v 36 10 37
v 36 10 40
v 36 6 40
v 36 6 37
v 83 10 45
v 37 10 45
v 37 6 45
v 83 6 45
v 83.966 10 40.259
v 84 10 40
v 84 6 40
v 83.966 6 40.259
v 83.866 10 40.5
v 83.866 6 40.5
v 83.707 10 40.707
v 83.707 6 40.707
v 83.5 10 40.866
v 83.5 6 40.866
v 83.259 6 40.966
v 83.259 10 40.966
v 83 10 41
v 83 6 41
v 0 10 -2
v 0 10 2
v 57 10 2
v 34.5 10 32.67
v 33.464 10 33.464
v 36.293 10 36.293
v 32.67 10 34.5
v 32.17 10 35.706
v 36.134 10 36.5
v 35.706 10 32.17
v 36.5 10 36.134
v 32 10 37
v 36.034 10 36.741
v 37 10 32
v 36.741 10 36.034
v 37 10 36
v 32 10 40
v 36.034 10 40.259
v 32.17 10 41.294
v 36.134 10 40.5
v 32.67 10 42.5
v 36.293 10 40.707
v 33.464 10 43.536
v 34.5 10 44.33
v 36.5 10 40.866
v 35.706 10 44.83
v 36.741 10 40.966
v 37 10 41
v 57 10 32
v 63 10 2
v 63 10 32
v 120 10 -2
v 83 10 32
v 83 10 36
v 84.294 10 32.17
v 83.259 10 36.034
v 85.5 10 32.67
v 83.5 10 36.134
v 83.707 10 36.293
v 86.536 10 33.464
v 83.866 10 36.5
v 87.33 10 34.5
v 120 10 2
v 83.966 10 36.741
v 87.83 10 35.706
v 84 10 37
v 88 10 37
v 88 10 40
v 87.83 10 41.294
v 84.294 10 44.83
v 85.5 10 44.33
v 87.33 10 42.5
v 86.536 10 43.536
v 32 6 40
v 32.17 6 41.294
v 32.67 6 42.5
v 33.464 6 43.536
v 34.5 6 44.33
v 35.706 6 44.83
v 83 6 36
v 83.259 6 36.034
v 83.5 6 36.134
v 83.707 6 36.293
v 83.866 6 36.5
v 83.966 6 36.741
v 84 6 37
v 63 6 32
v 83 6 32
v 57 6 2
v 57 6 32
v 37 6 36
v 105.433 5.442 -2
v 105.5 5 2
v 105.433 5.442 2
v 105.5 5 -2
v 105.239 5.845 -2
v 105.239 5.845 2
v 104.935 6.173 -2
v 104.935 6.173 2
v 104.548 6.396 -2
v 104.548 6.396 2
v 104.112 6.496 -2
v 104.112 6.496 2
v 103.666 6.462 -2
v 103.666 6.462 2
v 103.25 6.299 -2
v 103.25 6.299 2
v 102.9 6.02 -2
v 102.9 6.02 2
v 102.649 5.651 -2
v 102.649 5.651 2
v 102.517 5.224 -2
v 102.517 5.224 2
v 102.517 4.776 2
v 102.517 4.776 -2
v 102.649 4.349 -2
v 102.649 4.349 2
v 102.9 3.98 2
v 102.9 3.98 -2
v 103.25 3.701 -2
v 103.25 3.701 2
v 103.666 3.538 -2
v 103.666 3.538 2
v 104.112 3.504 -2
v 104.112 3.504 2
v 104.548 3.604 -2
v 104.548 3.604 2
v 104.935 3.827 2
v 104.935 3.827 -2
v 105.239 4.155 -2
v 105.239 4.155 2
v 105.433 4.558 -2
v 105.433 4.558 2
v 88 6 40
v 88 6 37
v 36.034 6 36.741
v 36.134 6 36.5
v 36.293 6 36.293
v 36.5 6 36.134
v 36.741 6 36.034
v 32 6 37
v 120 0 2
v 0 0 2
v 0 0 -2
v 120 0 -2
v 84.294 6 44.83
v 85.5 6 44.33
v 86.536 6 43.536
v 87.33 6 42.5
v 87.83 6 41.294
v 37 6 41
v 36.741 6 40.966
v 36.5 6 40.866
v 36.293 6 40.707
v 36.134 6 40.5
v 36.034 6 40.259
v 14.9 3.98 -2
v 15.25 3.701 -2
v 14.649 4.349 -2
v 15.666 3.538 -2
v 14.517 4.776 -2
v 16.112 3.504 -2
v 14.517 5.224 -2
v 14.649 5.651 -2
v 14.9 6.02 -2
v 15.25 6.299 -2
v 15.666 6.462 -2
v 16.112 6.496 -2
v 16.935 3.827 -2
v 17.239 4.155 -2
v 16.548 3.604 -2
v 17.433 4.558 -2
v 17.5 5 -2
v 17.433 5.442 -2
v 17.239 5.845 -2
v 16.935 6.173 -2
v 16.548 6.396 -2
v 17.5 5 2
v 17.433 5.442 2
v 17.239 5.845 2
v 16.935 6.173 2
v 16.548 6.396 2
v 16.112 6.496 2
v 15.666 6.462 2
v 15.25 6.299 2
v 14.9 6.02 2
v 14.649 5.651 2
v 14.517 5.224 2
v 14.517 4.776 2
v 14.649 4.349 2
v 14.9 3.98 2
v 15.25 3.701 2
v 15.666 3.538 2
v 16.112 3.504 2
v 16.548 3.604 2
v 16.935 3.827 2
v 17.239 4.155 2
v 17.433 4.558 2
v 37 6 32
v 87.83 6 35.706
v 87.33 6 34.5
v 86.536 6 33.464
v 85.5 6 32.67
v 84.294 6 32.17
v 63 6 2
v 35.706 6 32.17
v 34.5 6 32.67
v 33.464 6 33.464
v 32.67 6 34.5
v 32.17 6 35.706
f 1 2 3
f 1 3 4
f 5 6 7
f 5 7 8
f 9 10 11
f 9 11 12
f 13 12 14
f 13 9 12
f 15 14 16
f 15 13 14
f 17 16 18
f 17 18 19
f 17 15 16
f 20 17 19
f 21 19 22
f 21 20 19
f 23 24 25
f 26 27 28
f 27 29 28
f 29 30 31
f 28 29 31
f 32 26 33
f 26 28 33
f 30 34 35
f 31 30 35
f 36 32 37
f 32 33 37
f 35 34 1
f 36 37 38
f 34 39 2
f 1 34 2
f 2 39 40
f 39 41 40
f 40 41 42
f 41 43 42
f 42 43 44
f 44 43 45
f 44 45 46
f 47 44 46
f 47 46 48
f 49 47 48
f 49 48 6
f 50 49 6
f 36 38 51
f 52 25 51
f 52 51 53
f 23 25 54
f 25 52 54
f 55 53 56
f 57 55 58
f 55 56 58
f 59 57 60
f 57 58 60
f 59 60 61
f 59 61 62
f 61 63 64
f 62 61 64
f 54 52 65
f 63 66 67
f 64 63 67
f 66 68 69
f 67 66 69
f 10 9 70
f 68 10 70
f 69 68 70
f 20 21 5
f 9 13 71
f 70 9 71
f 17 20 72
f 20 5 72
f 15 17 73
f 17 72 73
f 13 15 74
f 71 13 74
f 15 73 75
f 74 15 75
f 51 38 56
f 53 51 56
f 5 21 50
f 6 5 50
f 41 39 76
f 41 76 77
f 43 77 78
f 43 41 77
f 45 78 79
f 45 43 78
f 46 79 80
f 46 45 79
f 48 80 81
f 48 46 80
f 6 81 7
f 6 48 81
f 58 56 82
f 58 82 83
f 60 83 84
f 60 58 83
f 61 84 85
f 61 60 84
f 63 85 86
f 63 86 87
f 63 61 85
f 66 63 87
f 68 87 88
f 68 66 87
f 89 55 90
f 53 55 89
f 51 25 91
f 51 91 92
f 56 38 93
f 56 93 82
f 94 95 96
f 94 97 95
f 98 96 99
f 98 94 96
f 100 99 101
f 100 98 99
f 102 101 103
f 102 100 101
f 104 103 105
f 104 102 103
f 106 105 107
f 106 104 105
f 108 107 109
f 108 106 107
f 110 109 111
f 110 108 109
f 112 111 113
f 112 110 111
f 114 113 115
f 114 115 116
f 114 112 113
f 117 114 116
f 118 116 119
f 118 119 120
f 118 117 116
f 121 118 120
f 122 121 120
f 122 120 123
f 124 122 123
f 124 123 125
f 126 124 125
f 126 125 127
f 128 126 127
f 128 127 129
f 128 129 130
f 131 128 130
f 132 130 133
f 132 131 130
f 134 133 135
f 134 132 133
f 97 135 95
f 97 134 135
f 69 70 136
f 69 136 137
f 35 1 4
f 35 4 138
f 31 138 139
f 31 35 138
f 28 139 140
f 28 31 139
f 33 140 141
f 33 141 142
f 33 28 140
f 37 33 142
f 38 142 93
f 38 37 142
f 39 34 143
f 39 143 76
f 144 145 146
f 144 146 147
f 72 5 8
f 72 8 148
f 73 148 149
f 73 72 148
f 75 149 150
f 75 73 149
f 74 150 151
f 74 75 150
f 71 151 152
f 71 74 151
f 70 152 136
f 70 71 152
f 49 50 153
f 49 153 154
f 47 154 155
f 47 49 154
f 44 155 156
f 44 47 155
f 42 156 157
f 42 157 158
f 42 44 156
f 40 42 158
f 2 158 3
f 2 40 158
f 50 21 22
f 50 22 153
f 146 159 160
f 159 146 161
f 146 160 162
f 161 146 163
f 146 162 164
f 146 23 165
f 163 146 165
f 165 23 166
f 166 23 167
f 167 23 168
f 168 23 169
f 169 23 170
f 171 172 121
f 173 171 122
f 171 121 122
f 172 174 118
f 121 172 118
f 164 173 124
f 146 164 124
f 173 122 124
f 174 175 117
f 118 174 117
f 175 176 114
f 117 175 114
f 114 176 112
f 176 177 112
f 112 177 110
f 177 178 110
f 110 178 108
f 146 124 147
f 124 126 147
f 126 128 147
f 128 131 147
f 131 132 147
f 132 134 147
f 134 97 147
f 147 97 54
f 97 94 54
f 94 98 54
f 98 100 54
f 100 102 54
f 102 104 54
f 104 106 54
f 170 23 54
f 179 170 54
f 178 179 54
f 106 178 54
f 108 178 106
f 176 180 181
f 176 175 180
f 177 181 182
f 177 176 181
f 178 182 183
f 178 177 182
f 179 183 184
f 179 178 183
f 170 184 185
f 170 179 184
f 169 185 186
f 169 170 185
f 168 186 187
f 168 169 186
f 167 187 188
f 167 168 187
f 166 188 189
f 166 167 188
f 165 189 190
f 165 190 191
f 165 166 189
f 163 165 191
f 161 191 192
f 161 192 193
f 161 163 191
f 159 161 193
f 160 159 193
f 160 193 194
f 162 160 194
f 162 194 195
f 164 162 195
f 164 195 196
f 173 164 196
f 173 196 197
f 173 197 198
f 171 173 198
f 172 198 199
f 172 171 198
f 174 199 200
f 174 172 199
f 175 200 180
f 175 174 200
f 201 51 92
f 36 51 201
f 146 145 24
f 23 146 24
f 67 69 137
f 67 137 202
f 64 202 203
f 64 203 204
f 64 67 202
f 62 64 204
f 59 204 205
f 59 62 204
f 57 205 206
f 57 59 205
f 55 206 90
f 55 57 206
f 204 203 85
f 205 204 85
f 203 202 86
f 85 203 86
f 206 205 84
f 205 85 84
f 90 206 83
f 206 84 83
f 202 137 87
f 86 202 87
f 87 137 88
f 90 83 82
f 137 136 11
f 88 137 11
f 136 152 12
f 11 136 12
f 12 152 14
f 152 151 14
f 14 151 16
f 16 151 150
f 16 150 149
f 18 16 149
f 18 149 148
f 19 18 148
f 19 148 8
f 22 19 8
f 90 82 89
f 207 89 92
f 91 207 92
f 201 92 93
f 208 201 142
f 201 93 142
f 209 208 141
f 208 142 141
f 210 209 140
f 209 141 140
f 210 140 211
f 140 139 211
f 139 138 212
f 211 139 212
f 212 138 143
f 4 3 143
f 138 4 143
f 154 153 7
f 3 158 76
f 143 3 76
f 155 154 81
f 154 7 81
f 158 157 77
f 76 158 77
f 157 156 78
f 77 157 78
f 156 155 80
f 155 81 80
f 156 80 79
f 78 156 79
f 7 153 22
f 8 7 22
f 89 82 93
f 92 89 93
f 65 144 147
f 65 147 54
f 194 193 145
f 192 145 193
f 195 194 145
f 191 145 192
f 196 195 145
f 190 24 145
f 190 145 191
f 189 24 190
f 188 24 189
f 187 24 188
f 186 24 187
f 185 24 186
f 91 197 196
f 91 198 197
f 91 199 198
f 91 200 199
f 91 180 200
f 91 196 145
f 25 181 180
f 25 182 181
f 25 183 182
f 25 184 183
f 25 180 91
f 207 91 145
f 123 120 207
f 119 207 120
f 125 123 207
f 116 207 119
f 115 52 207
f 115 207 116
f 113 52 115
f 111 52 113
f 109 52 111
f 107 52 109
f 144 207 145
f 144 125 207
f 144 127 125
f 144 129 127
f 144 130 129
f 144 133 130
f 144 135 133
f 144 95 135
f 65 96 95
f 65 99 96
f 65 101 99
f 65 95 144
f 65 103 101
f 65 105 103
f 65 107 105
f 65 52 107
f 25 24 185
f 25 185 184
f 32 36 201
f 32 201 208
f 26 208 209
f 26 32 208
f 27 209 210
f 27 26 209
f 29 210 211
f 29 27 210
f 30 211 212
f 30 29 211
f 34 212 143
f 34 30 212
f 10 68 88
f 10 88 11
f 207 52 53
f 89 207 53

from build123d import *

# Parameters (mm, degrees)
F0_W     = 120
F0_H     = 10
F0_R     = 1.5
F1_DEPTH = 2
F2_W     = 6
F2_H     = 30
F3_DEPTH = 4


with BuildPart() as f1:
    # F0 (on Top) → F1 (new body, symmetric)
    with BuildSketch(Plane.XY):
        with Locations((60, 5)):
            Rectangle(F0_W, F0_H)
        with Locations((16, 5)):
            Circle(F0_R, mode=Mode.SUBTRACT)
        with Locations((104, 5)):
            Circle(F0_R, mode=Mode.SUBTRACT)
    extrude(amount=F1_DEPTH, both=True)

    # F2 (on face) → F3 (join)
    with BuildSketch(Plane(origin=(0, 10, 0), x_dir=(-1, 0, 0), z_dir=(0, 1, 0))):
        with BuildLine():
            Line((-63, 32), (-57, 32))
            Line((-57, 32), (-37, 32))
            ThreePointArc((-37, 32), (-33.4644660941, 33.4644660941), (-32, 37))
            Line((-32, 37), (-32, 40))
            ThreePointArc((-32, 40), (-33.4644660941, 43.5355339059), (-37, 45))
            Line((-37, 45), (-83, 45))
            ThreePointArc((-83, 45), (-86.5355339059, 43.5355339059), (-88, 40))
            Line((-88, 40), (-88, 37))
            ThreePointArc((-88, 37), (-86.5355339059, 33.4644660941), (-83, 32))
            Line((-83, 32), (-63, 32))
        make_face()
        with BuildLine():
            ThreePointArc((-84, 40), (-83.7071067812, 40.7071067812), (-83, 41))
            Line((-83, 41), (-37, 41))
            ThreePointArc((-37, 41), (-36.2928932188, 40.7071067812), (-36, 40))
            Line((-36, 40), (-36, 37))
            ThreePointArc((-36, 37), (-36.2928932188, 36.2928932188), (-37, 36))
            Line((-37, 36), (-83, 36))
            ThreePointArc((-83, 36), (-83.7071067812, 36.2928932188), (-84, 37))
            Line((-84, 37), (-84, 40))
        make_face(mode=Mode.SUBTRACT)
        with Locations((-60, 17)):
            Rectangle(F2_W, F2_H)
    extrude(amount=-F3_DEPTH)


solid = f1.part
